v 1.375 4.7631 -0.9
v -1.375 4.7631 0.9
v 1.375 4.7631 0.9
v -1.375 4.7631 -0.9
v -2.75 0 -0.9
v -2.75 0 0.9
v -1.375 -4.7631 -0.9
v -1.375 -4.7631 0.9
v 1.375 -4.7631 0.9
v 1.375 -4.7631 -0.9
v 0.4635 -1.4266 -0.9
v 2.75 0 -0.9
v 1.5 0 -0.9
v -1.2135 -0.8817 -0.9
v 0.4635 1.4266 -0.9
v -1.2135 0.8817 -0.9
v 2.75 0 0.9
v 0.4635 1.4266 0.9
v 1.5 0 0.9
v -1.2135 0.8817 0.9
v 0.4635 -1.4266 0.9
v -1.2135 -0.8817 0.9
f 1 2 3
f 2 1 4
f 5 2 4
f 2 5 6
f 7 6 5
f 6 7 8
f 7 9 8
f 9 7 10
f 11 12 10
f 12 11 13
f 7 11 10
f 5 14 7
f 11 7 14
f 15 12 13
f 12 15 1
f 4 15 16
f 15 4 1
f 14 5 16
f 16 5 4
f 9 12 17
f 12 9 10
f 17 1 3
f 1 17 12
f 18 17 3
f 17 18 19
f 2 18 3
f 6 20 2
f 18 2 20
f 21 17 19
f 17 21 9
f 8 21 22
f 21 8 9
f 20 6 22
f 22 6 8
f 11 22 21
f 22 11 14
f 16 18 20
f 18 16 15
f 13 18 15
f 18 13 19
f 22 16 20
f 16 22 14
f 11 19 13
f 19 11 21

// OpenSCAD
// Parameters
thread_diameter = 3; //[1.5:6:0.1]
thread_pitch = 0.5; //[0.25:1:0.05]
across_flats = 5.5; //[2.75:11:0.1]
thickness = 1.8; //[0.9:3.6:0.1]
across_corners = 6.350852961085883; //[3.1754264805429413:12.701705922171765:0.1]
inner_hole_diameter_clearance = 3; //[2.5:3.6:0.05]
chamfer_top = 0; //[0:0.6:0.05]
chamfer_bottom = 0; //[0:0.6:0.05]
eps_overlap = 0.6; //[0.2:2:0.1]

// Hexagonal Nut
module hex_nut() {
  color("DimGray") {
    difference() {
      // Hexagonal body
      linear_extrude(height=thickness, center=true) {
        polygon(points=[
          [across_flats/2, 0],
          [across_flats/4, (across_flats/2)*tan(60)],
          [-across_flats/4, (across_flats/2)*tan(60)],
          [-across_flats/2, 0],
          [-across_flats/4, -(across_flats/2)*tan(60)],
          [across_flats/4, -(across_flats/2)*tan(60)]
        ]);
      }
      // Central through hole
      translate([0, 0, 0])
        cylinder(r=inner_hole_diameter_clearance/2, h=thickness + 2*eps_overlap, center=true);
    }
  }
}

// Assembly
module assembly() {
  hex_nut();
}

assembly();
